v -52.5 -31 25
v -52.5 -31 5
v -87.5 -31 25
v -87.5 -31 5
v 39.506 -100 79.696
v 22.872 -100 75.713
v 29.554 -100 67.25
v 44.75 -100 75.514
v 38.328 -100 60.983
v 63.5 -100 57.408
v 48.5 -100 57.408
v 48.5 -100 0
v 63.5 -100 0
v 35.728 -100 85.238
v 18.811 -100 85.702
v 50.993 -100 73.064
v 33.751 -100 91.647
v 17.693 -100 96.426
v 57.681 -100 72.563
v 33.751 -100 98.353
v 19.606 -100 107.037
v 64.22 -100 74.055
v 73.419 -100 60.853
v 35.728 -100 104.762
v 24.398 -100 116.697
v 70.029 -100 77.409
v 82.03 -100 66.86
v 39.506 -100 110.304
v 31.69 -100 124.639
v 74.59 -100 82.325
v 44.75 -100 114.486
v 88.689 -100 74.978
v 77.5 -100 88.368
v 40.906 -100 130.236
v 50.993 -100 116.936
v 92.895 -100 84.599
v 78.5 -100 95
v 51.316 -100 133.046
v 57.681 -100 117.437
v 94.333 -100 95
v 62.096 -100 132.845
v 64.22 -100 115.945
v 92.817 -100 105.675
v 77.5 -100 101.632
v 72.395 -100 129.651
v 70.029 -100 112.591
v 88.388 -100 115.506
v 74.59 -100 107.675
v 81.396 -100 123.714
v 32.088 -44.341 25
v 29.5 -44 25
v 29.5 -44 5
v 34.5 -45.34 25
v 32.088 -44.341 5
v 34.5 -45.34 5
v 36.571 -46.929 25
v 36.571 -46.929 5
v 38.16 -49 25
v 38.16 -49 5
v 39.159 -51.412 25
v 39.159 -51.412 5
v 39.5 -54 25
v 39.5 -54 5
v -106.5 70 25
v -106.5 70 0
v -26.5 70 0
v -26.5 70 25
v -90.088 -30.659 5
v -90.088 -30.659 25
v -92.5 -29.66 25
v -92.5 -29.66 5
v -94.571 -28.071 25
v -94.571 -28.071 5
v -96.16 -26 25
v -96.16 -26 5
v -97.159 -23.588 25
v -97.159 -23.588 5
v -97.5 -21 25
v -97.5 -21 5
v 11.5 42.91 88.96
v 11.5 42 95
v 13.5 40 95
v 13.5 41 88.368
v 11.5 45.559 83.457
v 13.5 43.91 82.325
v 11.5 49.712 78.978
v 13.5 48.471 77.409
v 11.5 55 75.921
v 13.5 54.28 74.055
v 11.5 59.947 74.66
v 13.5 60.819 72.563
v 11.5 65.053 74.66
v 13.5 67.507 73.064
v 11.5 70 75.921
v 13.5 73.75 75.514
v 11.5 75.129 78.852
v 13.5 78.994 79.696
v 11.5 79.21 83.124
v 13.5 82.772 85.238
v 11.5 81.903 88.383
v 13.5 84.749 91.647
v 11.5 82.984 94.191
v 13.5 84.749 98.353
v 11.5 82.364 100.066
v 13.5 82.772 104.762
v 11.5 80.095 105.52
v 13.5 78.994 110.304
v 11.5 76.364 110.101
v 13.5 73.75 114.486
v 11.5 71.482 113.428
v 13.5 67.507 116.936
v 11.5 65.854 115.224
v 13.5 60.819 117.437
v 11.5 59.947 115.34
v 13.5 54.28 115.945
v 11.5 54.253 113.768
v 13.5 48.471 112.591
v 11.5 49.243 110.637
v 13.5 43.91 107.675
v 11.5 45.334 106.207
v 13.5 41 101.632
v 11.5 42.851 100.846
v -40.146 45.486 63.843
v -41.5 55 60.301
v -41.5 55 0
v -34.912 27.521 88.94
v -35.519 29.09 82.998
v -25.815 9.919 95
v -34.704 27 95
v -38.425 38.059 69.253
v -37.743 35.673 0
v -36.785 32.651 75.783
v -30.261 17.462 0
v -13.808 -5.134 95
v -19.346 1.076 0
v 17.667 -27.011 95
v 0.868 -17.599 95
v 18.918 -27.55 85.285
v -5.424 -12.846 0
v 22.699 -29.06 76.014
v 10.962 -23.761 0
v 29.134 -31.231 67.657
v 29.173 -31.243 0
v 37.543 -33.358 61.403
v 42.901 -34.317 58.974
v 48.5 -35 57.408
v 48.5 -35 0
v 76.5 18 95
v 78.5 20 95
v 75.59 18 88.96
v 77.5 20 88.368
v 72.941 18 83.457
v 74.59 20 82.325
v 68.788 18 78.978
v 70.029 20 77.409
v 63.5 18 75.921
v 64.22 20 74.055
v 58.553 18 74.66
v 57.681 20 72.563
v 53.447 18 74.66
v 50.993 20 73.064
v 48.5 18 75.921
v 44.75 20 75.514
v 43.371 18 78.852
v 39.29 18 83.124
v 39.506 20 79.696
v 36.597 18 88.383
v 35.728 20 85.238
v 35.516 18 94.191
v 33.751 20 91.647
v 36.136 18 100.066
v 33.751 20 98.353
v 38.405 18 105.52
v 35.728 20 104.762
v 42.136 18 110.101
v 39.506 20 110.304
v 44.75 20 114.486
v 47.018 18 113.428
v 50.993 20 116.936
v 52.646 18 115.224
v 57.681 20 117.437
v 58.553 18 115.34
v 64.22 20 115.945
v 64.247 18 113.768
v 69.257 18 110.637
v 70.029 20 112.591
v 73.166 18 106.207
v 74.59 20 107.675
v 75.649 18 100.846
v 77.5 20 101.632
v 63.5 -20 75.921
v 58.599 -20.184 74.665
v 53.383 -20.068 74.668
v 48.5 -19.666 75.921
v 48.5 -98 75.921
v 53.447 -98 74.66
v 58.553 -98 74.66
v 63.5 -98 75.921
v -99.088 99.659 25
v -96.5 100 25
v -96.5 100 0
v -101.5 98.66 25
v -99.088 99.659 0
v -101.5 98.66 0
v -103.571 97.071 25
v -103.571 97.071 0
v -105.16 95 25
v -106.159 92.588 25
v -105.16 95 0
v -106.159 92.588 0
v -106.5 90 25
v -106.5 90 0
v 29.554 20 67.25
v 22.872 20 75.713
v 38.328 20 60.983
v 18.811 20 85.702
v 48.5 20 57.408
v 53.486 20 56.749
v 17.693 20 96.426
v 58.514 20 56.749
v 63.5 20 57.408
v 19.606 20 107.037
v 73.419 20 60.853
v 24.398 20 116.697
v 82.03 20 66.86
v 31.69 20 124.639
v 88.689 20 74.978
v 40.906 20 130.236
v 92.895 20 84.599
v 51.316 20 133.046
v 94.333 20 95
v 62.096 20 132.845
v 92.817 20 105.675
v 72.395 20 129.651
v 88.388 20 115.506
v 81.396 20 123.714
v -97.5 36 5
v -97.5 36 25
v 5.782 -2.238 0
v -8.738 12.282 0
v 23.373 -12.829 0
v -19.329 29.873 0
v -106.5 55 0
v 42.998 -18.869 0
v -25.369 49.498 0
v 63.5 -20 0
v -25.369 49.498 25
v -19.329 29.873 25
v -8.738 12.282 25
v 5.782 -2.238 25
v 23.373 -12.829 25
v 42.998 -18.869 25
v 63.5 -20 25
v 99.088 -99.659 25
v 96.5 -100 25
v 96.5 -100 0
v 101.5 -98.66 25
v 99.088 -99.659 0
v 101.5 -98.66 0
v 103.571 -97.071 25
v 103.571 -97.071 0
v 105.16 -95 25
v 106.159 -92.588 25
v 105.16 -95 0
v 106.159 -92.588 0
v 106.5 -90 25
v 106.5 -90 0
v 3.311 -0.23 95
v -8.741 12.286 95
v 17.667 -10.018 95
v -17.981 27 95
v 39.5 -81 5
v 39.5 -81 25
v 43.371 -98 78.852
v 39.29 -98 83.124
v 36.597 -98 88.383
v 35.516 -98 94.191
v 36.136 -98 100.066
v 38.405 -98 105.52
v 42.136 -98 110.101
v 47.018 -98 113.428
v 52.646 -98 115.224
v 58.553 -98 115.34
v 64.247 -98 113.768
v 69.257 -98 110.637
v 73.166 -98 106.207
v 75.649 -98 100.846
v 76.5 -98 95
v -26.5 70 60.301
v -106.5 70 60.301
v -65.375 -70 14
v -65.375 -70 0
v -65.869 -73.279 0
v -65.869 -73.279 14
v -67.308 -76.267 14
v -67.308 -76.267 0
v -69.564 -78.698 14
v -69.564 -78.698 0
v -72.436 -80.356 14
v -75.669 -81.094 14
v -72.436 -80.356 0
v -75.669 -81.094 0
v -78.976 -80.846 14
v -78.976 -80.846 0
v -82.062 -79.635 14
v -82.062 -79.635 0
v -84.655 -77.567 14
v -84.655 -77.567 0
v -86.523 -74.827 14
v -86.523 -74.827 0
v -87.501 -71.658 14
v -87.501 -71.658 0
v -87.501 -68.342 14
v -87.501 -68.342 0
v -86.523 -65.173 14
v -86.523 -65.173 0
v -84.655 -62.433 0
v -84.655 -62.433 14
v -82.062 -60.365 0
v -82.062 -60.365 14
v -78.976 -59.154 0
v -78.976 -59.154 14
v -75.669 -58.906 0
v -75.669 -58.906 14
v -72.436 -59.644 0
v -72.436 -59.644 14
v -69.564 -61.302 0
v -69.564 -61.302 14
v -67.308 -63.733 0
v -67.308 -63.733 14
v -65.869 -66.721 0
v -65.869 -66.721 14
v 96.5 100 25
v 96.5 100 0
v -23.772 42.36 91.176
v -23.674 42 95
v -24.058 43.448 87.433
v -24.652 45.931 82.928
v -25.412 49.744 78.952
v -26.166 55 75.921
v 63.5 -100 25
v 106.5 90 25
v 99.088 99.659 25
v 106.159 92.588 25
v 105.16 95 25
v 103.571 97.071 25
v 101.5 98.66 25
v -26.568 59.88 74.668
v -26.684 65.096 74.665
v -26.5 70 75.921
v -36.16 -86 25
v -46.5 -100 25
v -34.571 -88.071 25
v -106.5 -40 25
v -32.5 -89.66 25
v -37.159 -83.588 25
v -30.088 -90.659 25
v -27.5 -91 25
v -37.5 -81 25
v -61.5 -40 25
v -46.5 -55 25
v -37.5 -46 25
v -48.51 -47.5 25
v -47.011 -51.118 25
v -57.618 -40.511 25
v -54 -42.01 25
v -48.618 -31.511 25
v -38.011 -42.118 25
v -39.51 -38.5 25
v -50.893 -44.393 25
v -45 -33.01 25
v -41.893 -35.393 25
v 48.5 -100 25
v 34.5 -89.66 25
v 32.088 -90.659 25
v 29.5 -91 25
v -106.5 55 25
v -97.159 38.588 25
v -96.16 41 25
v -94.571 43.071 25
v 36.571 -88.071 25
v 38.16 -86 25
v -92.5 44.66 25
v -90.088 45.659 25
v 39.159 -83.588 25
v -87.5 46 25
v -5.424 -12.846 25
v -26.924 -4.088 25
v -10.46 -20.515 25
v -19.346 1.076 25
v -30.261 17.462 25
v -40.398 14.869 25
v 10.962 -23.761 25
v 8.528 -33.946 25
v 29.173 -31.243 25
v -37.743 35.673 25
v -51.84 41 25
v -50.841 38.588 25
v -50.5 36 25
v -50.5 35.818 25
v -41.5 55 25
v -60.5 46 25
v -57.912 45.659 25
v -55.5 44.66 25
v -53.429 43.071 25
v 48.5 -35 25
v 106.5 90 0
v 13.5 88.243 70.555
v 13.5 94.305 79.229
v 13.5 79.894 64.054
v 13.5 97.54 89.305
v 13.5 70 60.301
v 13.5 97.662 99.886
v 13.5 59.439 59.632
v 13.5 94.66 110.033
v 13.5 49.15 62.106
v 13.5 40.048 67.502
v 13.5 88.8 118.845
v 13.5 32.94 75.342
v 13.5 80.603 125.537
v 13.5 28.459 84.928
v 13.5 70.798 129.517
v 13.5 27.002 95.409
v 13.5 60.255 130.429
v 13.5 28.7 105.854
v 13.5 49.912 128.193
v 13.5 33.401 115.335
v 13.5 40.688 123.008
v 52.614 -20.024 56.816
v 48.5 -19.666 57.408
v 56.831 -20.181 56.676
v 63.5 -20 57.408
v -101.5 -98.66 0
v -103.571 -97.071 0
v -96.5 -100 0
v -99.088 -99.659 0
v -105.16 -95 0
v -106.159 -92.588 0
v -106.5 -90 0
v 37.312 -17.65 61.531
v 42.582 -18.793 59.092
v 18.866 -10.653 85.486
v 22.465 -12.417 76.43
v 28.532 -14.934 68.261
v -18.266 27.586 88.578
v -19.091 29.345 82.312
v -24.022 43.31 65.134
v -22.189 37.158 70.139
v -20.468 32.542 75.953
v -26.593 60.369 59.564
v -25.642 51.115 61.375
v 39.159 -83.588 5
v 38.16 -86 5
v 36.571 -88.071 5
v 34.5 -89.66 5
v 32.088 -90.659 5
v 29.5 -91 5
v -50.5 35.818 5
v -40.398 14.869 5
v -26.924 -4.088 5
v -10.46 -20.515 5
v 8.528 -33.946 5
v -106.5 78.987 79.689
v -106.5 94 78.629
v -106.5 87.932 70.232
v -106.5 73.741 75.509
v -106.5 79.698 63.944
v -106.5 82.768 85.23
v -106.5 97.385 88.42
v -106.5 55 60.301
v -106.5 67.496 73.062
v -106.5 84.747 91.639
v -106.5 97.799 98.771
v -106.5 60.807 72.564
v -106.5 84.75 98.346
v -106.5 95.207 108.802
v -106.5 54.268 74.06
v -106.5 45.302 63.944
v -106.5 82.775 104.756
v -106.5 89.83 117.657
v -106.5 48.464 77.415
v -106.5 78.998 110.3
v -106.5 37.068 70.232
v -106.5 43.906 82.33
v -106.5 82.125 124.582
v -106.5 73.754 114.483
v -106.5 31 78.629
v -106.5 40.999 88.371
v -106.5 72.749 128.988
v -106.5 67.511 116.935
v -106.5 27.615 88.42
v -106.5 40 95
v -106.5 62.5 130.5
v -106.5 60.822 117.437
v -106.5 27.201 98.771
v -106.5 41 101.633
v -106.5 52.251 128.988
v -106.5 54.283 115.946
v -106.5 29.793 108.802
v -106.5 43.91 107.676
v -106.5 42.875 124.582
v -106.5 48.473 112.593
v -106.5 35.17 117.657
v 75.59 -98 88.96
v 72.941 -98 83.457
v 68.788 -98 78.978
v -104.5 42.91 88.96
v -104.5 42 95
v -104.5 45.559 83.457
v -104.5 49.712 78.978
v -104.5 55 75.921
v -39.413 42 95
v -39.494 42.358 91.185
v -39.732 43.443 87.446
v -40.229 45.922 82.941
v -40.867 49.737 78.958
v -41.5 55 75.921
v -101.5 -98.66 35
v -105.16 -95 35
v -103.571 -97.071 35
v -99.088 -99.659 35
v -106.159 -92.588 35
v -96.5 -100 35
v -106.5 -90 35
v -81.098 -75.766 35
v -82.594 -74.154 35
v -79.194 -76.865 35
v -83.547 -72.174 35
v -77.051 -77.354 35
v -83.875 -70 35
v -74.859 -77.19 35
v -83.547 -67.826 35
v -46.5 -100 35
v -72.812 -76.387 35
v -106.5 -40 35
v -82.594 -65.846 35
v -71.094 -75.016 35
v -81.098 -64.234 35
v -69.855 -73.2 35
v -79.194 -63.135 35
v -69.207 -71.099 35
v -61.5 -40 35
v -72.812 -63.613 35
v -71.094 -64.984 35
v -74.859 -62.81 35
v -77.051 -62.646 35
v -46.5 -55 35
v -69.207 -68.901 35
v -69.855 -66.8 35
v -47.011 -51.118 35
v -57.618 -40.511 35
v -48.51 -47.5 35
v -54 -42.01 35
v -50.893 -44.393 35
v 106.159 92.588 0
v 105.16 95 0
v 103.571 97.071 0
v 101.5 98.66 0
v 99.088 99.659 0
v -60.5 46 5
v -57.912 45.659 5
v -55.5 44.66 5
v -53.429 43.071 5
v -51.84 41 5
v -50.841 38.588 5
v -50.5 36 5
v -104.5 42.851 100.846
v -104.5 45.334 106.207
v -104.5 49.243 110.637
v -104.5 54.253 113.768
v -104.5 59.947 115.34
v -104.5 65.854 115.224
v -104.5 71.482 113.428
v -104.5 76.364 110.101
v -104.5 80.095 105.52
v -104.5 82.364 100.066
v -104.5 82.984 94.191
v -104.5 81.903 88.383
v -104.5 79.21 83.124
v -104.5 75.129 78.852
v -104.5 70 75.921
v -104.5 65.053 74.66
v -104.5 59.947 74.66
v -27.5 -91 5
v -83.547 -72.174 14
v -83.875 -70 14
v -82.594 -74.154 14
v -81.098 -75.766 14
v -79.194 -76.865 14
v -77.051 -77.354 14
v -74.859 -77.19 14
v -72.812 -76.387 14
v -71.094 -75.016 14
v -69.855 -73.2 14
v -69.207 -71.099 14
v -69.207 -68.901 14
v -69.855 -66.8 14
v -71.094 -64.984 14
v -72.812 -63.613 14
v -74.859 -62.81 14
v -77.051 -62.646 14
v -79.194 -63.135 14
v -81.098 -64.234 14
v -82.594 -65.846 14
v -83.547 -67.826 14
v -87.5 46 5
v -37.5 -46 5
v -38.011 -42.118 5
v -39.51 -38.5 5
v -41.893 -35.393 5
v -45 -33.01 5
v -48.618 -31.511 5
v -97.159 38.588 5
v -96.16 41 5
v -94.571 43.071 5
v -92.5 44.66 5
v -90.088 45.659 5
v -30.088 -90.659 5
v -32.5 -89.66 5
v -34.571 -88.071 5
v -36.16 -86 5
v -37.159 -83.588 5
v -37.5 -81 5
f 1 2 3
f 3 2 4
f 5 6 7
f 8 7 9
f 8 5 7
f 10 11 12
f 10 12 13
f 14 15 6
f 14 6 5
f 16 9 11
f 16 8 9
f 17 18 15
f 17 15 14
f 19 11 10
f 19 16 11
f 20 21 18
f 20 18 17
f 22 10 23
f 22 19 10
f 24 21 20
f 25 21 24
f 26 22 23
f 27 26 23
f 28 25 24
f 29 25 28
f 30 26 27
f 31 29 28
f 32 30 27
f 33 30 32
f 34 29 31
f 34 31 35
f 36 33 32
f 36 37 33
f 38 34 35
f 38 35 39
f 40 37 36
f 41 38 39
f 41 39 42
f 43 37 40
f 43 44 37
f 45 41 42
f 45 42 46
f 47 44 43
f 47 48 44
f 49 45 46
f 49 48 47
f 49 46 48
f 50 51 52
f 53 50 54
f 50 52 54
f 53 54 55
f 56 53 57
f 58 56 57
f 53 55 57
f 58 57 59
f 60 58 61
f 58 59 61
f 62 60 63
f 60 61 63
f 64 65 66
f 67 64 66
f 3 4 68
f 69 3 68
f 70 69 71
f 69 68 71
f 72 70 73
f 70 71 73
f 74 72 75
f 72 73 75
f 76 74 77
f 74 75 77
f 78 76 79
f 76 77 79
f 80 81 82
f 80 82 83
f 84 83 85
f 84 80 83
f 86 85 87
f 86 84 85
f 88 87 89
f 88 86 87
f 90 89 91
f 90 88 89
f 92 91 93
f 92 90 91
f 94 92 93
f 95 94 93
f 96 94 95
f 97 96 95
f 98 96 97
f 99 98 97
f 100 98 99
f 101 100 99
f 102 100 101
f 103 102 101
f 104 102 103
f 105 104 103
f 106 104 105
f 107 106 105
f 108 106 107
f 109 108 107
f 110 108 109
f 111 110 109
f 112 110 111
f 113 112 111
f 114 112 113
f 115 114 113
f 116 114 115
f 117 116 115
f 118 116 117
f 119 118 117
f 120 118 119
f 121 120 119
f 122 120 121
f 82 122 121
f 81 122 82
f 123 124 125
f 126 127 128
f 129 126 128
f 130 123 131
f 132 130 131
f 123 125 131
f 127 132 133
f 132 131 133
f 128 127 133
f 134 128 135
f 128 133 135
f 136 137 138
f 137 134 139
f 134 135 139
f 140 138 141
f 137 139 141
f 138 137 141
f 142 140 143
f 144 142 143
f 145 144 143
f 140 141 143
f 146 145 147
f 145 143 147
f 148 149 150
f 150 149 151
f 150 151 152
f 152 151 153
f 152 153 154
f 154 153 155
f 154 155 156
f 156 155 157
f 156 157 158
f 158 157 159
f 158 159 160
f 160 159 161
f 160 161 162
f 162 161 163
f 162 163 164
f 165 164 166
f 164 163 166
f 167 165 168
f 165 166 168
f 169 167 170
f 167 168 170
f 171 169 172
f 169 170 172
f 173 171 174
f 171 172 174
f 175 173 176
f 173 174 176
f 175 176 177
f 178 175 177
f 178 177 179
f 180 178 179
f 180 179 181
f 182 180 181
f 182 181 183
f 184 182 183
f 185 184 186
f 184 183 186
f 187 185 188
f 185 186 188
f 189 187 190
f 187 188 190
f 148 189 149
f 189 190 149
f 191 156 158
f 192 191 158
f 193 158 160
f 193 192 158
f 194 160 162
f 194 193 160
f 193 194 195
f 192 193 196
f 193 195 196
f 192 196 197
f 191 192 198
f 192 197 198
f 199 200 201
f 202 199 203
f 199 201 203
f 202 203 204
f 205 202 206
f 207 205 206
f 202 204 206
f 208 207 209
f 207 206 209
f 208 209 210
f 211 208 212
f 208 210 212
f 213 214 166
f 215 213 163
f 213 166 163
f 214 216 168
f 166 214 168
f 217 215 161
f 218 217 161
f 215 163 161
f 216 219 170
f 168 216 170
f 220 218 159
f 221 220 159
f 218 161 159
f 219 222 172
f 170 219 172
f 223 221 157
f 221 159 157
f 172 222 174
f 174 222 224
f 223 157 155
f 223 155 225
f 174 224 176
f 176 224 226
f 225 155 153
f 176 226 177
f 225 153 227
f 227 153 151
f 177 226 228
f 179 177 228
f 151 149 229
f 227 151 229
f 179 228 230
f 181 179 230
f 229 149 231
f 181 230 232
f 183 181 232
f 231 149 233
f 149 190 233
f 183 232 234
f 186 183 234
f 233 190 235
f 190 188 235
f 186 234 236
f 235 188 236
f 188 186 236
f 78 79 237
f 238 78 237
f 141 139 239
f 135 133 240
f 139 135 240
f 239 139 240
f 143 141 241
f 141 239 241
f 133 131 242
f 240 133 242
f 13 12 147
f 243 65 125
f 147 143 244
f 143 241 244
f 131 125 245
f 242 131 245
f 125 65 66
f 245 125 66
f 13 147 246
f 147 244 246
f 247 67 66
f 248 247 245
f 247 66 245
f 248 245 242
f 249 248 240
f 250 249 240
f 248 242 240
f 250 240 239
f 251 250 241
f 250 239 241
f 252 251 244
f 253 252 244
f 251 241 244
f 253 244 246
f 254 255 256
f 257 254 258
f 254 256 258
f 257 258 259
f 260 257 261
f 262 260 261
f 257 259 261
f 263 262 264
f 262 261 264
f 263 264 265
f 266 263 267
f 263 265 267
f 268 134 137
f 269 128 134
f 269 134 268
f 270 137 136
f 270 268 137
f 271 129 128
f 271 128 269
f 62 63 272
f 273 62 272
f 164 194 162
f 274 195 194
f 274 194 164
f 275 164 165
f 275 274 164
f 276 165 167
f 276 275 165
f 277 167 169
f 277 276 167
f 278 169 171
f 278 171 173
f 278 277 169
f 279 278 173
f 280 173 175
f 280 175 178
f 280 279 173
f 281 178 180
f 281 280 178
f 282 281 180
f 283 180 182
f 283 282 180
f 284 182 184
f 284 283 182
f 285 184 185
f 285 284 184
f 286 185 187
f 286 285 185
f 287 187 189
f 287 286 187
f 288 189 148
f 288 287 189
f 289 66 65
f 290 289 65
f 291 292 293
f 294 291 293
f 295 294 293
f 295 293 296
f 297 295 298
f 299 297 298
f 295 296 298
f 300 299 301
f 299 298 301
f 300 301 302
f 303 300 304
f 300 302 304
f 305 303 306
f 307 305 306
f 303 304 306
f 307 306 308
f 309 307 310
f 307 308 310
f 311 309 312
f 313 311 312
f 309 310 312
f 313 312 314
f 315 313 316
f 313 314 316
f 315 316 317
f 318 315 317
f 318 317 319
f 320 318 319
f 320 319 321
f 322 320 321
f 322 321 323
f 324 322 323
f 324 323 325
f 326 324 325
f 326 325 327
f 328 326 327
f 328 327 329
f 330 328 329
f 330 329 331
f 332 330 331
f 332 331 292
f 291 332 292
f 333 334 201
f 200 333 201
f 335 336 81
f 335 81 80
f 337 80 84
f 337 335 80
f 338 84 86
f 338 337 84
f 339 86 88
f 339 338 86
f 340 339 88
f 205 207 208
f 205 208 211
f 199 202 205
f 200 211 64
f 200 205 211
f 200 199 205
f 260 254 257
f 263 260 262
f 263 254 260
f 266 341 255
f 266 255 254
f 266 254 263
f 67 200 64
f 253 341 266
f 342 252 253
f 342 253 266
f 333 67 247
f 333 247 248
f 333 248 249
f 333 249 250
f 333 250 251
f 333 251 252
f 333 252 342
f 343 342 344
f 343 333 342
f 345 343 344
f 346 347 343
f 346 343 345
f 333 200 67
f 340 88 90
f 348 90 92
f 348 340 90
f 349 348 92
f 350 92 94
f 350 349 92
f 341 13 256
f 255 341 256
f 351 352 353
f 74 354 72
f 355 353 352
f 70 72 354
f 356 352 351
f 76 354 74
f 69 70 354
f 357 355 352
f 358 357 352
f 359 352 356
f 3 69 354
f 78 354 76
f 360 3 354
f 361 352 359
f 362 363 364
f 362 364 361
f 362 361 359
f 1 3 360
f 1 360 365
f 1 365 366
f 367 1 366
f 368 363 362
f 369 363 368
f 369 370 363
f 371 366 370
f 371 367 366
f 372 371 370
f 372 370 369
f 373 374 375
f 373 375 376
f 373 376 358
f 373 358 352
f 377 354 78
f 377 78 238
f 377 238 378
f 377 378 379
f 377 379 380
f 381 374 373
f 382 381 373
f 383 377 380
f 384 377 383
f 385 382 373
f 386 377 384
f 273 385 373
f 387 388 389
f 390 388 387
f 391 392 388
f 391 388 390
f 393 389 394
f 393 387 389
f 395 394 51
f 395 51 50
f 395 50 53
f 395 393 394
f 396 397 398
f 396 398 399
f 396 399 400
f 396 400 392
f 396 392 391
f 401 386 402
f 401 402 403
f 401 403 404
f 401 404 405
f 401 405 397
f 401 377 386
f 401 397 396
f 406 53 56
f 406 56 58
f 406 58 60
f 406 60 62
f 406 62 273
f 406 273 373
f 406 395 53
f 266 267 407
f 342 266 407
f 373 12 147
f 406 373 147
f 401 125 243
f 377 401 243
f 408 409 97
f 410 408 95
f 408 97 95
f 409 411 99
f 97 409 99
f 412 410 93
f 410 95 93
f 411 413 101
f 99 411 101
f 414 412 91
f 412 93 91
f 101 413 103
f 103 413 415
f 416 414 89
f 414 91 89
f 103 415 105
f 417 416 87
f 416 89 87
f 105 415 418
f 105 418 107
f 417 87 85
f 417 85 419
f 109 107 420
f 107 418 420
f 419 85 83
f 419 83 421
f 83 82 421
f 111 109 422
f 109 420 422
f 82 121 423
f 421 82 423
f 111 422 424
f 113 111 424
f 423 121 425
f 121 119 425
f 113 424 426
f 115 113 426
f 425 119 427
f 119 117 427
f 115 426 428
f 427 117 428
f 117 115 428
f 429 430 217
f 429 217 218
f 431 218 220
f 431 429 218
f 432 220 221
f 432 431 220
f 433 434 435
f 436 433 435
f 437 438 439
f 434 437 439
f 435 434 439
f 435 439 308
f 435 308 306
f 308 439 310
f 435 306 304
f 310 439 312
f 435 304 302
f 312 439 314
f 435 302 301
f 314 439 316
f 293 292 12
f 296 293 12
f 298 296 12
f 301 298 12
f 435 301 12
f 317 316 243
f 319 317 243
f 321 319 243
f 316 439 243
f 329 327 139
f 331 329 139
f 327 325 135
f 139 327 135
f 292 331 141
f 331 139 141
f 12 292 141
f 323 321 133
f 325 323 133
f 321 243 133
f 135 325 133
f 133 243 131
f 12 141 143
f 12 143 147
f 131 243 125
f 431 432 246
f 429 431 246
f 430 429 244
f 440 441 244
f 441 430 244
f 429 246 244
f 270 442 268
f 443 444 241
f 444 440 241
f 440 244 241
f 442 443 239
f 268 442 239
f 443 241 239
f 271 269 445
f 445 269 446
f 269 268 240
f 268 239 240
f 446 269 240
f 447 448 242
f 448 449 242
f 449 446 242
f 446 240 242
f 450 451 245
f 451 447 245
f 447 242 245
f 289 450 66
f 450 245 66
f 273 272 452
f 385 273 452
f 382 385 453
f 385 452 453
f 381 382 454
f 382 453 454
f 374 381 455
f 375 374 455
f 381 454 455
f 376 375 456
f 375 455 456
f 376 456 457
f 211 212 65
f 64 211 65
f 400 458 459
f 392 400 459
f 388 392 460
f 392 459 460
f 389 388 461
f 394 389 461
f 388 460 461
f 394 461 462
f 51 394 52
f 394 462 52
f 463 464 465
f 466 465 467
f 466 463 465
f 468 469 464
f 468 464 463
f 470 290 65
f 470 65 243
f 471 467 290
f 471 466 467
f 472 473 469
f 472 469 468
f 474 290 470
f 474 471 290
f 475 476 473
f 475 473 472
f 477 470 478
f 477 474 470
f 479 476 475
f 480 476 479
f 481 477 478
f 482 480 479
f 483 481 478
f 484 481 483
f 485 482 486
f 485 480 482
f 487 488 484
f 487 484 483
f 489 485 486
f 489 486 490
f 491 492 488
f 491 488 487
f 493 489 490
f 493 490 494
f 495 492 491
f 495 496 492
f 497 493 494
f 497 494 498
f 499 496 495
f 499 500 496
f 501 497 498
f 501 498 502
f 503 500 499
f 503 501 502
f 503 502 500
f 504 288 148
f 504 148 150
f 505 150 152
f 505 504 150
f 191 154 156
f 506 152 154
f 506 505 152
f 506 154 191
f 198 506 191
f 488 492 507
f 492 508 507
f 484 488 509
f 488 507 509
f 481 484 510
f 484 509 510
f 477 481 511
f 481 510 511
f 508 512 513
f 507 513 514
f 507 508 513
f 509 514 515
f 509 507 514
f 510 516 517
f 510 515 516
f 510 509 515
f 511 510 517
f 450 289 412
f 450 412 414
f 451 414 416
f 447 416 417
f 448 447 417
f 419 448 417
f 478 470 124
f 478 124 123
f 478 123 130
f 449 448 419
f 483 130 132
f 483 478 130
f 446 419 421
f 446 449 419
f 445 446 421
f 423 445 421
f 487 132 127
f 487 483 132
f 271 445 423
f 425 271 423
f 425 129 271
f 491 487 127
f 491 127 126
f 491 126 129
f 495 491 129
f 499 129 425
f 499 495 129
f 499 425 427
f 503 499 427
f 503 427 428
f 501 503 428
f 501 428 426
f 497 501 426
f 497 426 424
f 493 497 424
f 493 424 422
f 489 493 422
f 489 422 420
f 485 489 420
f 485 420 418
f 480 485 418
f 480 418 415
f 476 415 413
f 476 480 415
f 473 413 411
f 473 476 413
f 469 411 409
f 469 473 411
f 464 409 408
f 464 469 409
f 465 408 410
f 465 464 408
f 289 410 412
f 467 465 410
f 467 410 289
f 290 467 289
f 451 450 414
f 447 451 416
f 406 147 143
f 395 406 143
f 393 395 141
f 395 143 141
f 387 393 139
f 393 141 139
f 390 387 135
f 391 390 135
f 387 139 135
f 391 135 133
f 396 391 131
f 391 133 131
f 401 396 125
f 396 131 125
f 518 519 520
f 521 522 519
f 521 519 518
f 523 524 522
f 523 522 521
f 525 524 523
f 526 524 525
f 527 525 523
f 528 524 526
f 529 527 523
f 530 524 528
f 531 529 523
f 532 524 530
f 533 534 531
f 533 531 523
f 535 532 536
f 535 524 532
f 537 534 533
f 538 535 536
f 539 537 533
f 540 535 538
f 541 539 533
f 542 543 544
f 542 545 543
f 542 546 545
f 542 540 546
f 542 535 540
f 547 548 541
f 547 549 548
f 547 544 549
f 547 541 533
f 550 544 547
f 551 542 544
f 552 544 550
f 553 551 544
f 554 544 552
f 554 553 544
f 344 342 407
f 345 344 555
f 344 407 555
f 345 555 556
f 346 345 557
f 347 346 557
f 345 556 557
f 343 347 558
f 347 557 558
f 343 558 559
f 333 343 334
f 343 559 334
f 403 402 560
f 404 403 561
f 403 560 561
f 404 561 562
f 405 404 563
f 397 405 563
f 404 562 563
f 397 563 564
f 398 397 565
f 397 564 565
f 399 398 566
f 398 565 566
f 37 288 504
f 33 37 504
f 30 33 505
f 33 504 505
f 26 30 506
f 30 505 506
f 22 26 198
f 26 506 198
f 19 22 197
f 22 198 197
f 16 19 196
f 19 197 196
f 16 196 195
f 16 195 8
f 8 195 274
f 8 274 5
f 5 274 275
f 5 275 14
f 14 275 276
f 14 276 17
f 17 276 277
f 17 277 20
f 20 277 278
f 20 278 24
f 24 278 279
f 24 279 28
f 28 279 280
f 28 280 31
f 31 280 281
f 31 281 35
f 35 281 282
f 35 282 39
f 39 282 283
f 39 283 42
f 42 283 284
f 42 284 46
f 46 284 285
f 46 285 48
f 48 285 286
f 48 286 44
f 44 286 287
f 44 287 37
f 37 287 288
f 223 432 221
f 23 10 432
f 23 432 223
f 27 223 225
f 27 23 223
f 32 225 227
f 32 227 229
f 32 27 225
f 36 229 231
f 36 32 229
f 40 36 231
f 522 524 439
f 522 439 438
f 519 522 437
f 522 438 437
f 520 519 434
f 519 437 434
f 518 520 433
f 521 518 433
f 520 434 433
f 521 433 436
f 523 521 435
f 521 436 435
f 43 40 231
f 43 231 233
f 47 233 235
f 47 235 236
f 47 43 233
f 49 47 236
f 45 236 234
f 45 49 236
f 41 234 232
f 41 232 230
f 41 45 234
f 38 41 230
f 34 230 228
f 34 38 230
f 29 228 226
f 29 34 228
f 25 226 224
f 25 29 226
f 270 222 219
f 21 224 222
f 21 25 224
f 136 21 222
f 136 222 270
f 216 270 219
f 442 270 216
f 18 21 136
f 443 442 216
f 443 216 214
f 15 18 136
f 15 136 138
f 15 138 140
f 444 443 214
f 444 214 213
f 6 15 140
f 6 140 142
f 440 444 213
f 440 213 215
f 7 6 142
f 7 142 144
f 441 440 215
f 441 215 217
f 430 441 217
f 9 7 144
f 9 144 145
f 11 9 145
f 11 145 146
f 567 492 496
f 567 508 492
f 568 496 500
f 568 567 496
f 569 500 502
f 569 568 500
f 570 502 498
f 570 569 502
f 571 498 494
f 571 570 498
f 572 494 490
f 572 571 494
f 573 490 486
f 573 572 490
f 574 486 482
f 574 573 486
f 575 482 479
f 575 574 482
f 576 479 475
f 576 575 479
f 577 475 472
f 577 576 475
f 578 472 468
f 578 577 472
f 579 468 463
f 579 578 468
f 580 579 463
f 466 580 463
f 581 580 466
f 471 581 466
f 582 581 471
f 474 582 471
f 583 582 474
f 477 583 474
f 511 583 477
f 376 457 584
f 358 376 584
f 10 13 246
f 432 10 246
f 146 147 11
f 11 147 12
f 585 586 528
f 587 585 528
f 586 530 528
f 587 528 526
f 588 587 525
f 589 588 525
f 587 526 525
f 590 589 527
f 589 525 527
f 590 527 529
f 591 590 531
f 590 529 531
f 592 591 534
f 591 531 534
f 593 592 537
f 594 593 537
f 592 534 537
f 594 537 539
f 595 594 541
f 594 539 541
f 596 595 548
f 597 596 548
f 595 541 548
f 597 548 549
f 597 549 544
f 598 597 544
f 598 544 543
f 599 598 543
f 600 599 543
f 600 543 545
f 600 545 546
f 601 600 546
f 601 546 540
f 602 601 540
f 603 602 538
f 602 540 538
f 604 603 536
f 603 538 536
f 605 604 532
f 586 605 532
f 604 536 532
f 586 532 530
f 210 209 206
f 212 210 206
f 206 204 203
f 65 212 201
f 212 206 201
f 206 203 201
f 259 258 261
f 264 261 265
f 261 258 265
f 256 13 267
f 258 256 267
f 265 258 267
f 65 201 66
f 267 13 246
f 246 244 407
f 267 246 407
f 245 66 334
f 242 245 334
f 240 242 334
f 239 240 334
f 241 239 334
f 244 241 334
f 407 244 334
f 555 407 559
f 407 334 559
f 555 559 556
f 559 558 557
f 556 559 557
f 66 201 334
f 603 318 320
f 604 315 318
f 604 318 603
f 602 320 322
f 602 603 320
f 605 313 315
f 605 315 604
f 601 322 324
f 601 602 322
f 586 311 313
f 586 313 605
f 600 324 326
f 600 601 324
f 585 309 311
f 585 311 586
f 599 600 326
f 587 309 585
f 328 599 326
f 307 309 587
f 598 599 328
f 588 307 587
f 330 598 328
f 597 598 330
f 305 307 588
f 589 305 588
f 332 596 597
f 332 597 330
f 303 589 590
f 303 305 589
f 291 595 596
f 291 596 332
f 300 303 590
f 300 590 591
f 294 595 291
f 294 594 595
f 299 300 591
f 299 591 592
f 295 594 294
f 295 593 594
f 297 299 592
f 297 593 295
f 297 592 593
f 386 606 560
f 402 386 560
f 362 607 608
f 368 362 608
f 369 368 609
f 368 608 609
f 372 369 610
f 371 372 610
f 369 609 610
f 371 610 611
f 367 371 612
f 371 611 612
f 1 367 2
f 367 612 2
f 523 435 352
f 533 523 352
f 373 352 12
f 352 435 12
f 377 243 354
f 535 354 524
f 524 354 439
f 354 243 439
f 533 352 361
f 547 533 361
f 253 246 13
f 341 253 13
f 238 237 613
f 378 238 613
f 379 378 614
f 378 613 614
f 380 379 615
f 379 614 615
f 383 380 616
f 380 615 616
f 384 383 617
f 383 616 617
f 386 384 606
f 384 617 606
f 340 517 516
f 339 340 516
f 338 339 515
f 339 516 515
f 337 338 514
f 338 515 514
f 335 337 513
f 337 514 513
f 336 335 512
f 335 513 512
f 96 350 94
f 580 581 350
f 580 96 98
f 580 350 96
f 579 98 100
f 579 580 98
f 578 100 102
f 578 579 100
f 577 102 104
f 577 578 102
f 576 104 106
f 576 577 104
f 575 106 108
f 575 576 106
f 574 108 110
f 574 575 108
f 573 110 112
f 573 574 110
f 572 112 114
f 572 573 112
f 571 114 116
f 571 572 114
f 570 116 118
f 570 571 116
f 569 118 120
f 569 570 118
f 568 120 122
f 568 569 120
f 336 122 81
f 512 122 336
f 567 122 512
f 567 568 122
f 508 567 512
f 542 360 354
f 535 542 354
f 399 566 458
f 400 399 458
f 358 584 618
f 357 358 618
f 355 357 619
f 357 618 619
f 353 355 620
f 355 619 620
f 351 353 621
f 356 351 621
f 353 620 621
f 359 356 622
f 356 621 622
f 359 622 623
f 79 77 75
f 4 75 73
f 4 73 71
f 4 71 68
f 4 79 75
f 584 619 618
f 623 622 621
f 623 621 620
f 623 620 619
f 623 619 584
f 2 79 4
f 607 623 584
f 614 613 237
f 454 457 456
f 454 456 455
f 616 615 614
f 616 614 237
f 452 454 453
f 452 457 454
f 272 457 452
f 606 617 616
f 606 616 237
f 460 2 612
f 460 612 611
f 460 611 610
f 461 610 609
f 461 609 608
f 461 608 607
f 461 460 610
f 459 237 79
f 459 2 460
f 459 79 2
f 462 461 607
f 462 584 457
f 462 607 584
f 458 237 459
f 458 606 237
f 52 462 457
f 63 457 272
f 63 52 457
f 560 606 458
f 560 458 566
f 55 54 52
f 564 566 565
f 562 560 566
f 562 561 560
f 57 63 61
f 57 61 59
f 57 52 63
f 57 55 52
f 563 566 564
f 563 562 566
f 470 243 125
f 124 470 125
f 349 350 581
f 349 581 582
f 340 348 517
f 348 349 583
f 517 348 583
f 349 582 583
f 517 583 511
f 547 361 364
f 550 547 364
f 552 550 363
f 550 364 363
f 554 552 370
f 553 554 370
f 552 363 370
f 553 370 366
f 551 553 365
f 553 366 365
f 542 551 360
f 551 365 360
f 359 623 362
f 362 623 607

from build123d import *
from build123d import SkipClean  # not in build123d's __all__

# Parameters (mm, degrees)
F1_DEPTH       = 35
F2_DEPTH       = 25
F3_DEPTH       = 95
F4_DEPTH       = 5
F5_D           = 14.75
F5_CBORE_D     = 22.25
F5_CBORE_DEPTH = 14
F7_DEPTH       = 120
F8_DEPTH       = 120
F10_DEPTH      = 120
F11_DEPTH      = 120
F12_T2_ANGLE   = 42.9202554989
F12_T4_ANGLE   = 248.5398722506
F12_T6_ANGLE   = 68.5398722506


# Not quite as in the source:
# - a fillet or chamfer that OpenCascade refuses, or shapes differently, is made with other operations: its cross-section is extruded or revolved along the edge and cut away or added


with BuildPart() as f1:
    # F0 (on Top) → F1 (new body)
    with BuildSketch(Plane.XY):
        with BuildLine():
            Line((-96.5, -100), (-46.5, -100))
            Line((-46.5, -100), (-46.5, -55))
            ThreePointArc((-46.5, -55), (-50.8933982822, -44.3933982822), (-61.5, -40))
            Line((-61.5, -40), (-106.5, -40))
            Line((-106.5, -40), (-106.5, -90))
            ThreePointArc((-106.5, -90), (-103.5710678119, -97.0710678119), (-96.5, -100))
        make_face()
    extrude(amount=F1_DEPTH)

    # F0 (on Top) → F2 (join)
    with BuildSketch(Plane.XY):
        with BuildLine():
            Line((-46.5, -100), (48.5, -100))
            Line((48.5, -100), (48.5, -35))
            ThreePointArc((48.5, -35), (-12.7295911164, -6.2295911164), (-41.5, 55))
            Line((-41.5, 55), (-106.5, 55))
            Line((-106.5, 55), (-106.5, -40))
            Line((-106.5, -40), (-61.5, -40))
            ThreePointArc((-61.5, -40), (-50.8933982822, -44.3933982822), (-46.5, -55))
            Line((-46.5, -55), (-46.5, -100))
        make_face()
        with BuildLine():
            Line((-97.5, -21), (-97.5, 36))
            ThreePointArc((-97.5, 36), (-94.5710678119, 43.0710678119), (-87.5, 46))
            Line((-87.5, 46), (-60.5, 46))
            ThreePointArc((-60.5, 46), (-53.4289321881, 43.0710678119), (-50.5, 36))
            Line((-50.5, 36), (-50.5, 35.8177255686))
            ThreePointArc((-50.5, 35.8177255686), (-19.0382464985, -12.6488819399), (29.5, -44))
            ThreePointArc((29.5, -44), (36.5710678119, -46.9289321881), (39.5, -54))
            Line((39.5, -54), (39.5, -81))
            ThreePointArc((39.5, -81), (36.5710678119, -88.0710678119), (29.5, -91))
            Line((29.5, -91), (-27.5, -91))
            ThreePointArc((-27.5, -91), (-34.5710678119, -88.0710678119), (-37.5, -81))
            Line((-37.5, -81), (-37.5, -46))
            ThreePointArc((-37.5, -46), (-41.8933982822, -35.3933982822), (-52.5, -31))
            Line((-52.5, -31), (-87.5, -31))
            ThreePointArc((-87.5, -31), (-94.5710678119, -28.0710678119), (-97.5, -21))
        make_face(mode=Mode.SUBTRACT)
    extrude(amount=F2_DEPTH)

    # F0 (on Top) → F4 (join)
    with BuildSketch(Plane.XY):
        with BuildLine():
            ThreePointArc((-87.5, 46), (-94.5710678119, 43.0710678119), (-97.5, 36))
            Line((-97.5, 36), (-97.5, -21))
            ThreePointArc((-97.5, -21), (-94.5710678119, -28.0710678119), (-87.5, -31))
            Line((-87.5, -31), (-52.5, -31))
            ThreePointArc((-52.5, -31), (-41.8933982822, -35.3933982822), (-37.5, -46))
            Line((-37.5, -46), (-37.5, -81))
            ThreePointArc((-37.5, -81), (-34.5710678119, -88.0710678119), (-27.5, -91))
            Line((-27.5, -91), (29.5, -91))
            ThreePointArc((29.5, -91), (36.5710678119, -88.0710678119), (39.5, -81))
            Line((39.5, -81), (39.5, -54))
            ThreePointArc((39.5, -54), (36.5710678119, -46.9289321881), (29.5, -44))
            ThreePointArc((29.5, -44), (-19.0382464985, -12.6488819399), (-50.5, 35.8177255686))
            Line((-50.5, 35.8177255686), (-50.5, 36))
            ThreePointArc((-50.5, 36), (-53.4289321881, 43.0710678119), (-60.5, 46))
            Line((-60.5, 46), (-87.5, 46))
        make_face()
    extrude(amount=F4_DEPTH)

    # F5 (through all)
    with Locations(Plane(origin=(0, 0, 0), x_dir=(1, 0, 0), z_dir=(0, 0, -1))):
        with Locations((-76.5, 70)):
            CounterBoreHole(F5_D / 2, F5_CBORE_D / 2, F5_CBORE_DEPTH)


with BuildPart() as f2:
    # F0 (on Top) → F2, piece 2 (new body)
    with BuildSketch(Plane.XY):
        with BuildLine():
            Line((63.5, -100), (96.5, -100))
            ThreePointArc((96.5, -100), (103.5710678119, -97.0710678119), (106.5, -90))
            Line((106.5, -90), (106.5, 90))
            ThreePointArc((106.5, 90), (103.5710678119, 97.0710678119), (96.5, 100))
            Line((96.5, 100), (-96.5, 100))
            ThreePointArc((-96.5, 100), (-103.5710678119, 97.0710678119), (-106.5, 90))
            Line((-106.5, 90), (-106.5, 70))
            Line((-106.5, 70), (-26.5, 70))
            ThreePointArc((-26.5, 70), (-1.9204107639, 4.5795892361), (63.5, -20))
            Line((63.5, -20), (63.5, -100))
        make_face()
    extrude(amount=F2_DEPTH)


with BuildPart() as f3:
    # F0 (on Top) → F3 (new body)
    with BuildSketch(Plane.XY):
        with BuildLine():
            Line((48.5, -100), (63.5, -100))
            Line((63.5, -100), (63.5, -20))
            ThreePointArc((63.5, -20), (-1.9204107639, 4.5795892361), (-26.5, 70))
            Line((-26.5, 70), (-106.5, 70))
            Line((-106.5, 70), (-106.5, 55))
            Line((-106.5, 55), (-41.5, 55))
            ThreePointArc((-41.5, 55), (-12.7295911164, -6.2295911164), (48.5, -35))
            Line((48.5, -35), (48.5, -100))
        make_face()
    extrude(amount=F3_DEPTH)

    # F6 (on face) → F7 (cut)
    with BuildSketch(Plane.XZ.offset(100)):
        with BuildLine():
            Line((63.5, 75.9212159717), (63.5, 95))
            Line((63.5, 95), (48.5, 95))
            Line((48.5, 95), (48.5, 75.9212159717))
            ThreePointArc((48.5, 75.9212159717), (56, 74.5), (63.5, 75.9212159717))
        make_face()
        with BuildLine():
            Line((48.5, 95), (63.5, 95))
            Line((63.5, 95), (63.5, 75.9212159717))
            ThreePointArc((63.5, 75.9212159717), (72.9410743461, 83.4566036194), (76.5, 95))
            ThreePointArc((76.5, 95), (44.4566036194, 111.9410743461), (48.5, 75.9212159717))
            Line((48.5, 75.9212159717), (48.5, 95))
        make_face()
    extrude(amount=-F7_DEPTH, mode=Mode.SUBTRACT)

    # F6 (on face) → F8 (join)
    with BuildSketch(Plane.XZ.offset(100)):
        with BuildLine():
            ThreePointArc((76.5, 95), (72.9410743461, 83.4566036194), (63.5, 75.9212159717))
            Line((63.5, 75.9212159717), (63.5, 57.4075214209))
            ThreePointArc((63.5, 57.4075214209), (85.6390320848, 70.6900797451), (94.33333335, 95))
            ThreePointArc((94.33333335, 95), (31.6900797451, 124.6390320848), (48.5, 57.4075214209))
            Line((48.5, 57.4075214209), (48.5, 75.9212159717))
            ThreePointArc((48.5, 75.9212159717), (44.4566036194, 111.9410743461), (76.5, 95))
        make_face()
        with BuildLine():
            Line((63.5, 57.4075214209), (63.5, 75.9212159717))
            ThreePointArc((63.5, 75.9212159717), (56, 74.5), (48.5, 75.9212159717))
            Line((48.5, 75.9212159717), (48.5, 57.4075214209))
            ThreePointArc((48.5, 57.4075214209), (56, 56.66666665), (63.5, 57.4075214209))
        make_face()
    extrude(amount=-F8_DEPTH)

    # F9 (on face) → F10 (cut)
    with BuildSketch(Plane(origin=(-106.5, 0, 0), x_dir=(0, -1, 0), z_dir=(-1, 0, 0))):
        with BuildLine():
            Line((-55, 75.9212159717), (-55, 95))
            Line((-55, 95), (-70, 95))
            Line((-70, 95), (-70, 75.9212159717))
            ThreePointArc((-70, 75.9212159717), (-62.5, 74.5), (-55, 75.9212159717))
        make_face()
        with BuildLine():
            Line((-70, 95), (-55, 95))
            Line((-55, 95), (-55, 75.9212159717))
            ThreePointArc((-55, 75.9212159717), (-45.5589256539, 83.4566036194), (-42, 95))
            ThreePointArc((-42, 95), (-74.0433963806, 111.9410743461), (-70, 75.9212159717))
            Line((-70, 75.9212159717), (-70, 95))
        make_face()
    extrude(amount=-F10_DEPTH, mode=Mode.SUBTRACT)

    # F9 (on face) → F11 (join)
    with BuildSketch(Plane(origin=(-106.5, 0, 0), x_dir=(0, -1, 0), z_dir=(-1, 0, 0))):
        with BuildLine():
            ThreePointArc((-42, 95), (-45.5589256539, 83.4566036194), (-55, 75.9212159717))
            Line((-55, 75.9212159717), (-55, 60.3012968542))
            ThreePointArc((-55, 60.3012968542), (-34.8730204329, 72.7065031904), (-27, 95))
            ThreePointArc((-27, 95), (-84.7934968096, 122.6269795671), (-70, 60.3012968542))
            Line((-70, 60.3012968542), (-70, 75.9212159717))
            ThreePointArc((-70, 75.9212159717), (-74.0433963806, 111.9410743461), (-42, 95))
        make_face()
        with BuildLine():
            Line((-55, 60.3012968542), (-55, 75.9212159717))
            ThreePointArc((-55, 75.9212159717), (-62.5, 74.5), (-70, 75.9212159717))
            Line((-70, 75.9212159717), (-70, 60.3012968542))
            ThreePointArc((-70, 60.3012968542), (-62.5, 59.5), (-55, 60.3012968542))
        make_face()
    with SkipClean():  # cleaning this boolean's faces spoils the solid; the shape is the same uncleaned
        extrude(amount=-F11_DEPTH)

    # F12: chamfer of 2 on 6 edges, made by hand

    # F12_s1 → F12_t2 (revolve, cut)
    with BuildSketch(Plane(origin=(0, 86.4809842241, 33.9962641601), x_dir=(1, 0, 0), z_dir=(0, 0.9306723916, 0.3658536585))):
        Polygon((-106.5, -43.048023546), (-104.5, -45.048023546), (-106.5, -45.048023546), align=None)
    revolve(axis=Axis((-106.5, 62.5, 95), (-1, 0, 0)), revolution_arc=F12_T2_ANGLE, mode=Mode.SUBTRACT)

    # F12_s3 → F12_t4 (revolve, cut)
    with BuildSketch(Plane(origin=(0, 86.4809842241, 33.9962641601), x_dir=(1, 0, 0), z_dir=(0, -0.9306723916, -0.3658536585))):
        Polygon((-106.5, 43.048023546), (-104.5, 45.048023546), (-106.5, 45.048023546), align=None)
    revolve(axis=Axis((-106.5, 62.5, 95), (1, 0, 0)), revolution_arc=F12_T4_ANGLE, mode=Mode.SUBTRACT)

    # F12_s5 → F12_t6 (revolve, cut)
    with BuildSketch(Plane.XY.offset(95)):
        Polygon((-106.5, 40), (-104.5, 42), (-106.5, 42), align=None)
    revolve(axis=Axis((-106.5, 62.5, 95), (1, 0, 0)), revolution_arc=F12_T6_ANGLE, mode=Mode.SUBTRACT)

    # F12_s7 → F12_t8 (revolve, cut)
    with BuildSketch(Plane.XY.offset(95)):
        Polygon((13.5, 40), (11.5, 42), (13.5, 42), align=None)
    revolve(axis=Axis((13.5, 62.5, 95), (1, 0, 0)), mode=Mode.SUBTRACT)

    # F12_s9 → F12_t10 (revolve, cut)
    with BuildSketch(Plane.XY.offset(95)):
        Polygon((76.5, 18), (78.5, 20), (76.5, 20), align=None)
    revolve(axis=Axis((56, 20, 95), (0, 1, 0)), mode=Mode.SUBTRACT)

    # F12_s11 → F12_t12 (revolve, cut)
    with BuildSketch(Plane.XY.offset(95)):
        Polygon((78.5, -100), (76.5, -98), (76.5, -100), align=None)
    revolve(axis=Axis((56, -100, 95), (0, 1, 0)), mode=Mode.SUBTRACT)


solid = Compound([f1.part, f2.part, f3.part])
